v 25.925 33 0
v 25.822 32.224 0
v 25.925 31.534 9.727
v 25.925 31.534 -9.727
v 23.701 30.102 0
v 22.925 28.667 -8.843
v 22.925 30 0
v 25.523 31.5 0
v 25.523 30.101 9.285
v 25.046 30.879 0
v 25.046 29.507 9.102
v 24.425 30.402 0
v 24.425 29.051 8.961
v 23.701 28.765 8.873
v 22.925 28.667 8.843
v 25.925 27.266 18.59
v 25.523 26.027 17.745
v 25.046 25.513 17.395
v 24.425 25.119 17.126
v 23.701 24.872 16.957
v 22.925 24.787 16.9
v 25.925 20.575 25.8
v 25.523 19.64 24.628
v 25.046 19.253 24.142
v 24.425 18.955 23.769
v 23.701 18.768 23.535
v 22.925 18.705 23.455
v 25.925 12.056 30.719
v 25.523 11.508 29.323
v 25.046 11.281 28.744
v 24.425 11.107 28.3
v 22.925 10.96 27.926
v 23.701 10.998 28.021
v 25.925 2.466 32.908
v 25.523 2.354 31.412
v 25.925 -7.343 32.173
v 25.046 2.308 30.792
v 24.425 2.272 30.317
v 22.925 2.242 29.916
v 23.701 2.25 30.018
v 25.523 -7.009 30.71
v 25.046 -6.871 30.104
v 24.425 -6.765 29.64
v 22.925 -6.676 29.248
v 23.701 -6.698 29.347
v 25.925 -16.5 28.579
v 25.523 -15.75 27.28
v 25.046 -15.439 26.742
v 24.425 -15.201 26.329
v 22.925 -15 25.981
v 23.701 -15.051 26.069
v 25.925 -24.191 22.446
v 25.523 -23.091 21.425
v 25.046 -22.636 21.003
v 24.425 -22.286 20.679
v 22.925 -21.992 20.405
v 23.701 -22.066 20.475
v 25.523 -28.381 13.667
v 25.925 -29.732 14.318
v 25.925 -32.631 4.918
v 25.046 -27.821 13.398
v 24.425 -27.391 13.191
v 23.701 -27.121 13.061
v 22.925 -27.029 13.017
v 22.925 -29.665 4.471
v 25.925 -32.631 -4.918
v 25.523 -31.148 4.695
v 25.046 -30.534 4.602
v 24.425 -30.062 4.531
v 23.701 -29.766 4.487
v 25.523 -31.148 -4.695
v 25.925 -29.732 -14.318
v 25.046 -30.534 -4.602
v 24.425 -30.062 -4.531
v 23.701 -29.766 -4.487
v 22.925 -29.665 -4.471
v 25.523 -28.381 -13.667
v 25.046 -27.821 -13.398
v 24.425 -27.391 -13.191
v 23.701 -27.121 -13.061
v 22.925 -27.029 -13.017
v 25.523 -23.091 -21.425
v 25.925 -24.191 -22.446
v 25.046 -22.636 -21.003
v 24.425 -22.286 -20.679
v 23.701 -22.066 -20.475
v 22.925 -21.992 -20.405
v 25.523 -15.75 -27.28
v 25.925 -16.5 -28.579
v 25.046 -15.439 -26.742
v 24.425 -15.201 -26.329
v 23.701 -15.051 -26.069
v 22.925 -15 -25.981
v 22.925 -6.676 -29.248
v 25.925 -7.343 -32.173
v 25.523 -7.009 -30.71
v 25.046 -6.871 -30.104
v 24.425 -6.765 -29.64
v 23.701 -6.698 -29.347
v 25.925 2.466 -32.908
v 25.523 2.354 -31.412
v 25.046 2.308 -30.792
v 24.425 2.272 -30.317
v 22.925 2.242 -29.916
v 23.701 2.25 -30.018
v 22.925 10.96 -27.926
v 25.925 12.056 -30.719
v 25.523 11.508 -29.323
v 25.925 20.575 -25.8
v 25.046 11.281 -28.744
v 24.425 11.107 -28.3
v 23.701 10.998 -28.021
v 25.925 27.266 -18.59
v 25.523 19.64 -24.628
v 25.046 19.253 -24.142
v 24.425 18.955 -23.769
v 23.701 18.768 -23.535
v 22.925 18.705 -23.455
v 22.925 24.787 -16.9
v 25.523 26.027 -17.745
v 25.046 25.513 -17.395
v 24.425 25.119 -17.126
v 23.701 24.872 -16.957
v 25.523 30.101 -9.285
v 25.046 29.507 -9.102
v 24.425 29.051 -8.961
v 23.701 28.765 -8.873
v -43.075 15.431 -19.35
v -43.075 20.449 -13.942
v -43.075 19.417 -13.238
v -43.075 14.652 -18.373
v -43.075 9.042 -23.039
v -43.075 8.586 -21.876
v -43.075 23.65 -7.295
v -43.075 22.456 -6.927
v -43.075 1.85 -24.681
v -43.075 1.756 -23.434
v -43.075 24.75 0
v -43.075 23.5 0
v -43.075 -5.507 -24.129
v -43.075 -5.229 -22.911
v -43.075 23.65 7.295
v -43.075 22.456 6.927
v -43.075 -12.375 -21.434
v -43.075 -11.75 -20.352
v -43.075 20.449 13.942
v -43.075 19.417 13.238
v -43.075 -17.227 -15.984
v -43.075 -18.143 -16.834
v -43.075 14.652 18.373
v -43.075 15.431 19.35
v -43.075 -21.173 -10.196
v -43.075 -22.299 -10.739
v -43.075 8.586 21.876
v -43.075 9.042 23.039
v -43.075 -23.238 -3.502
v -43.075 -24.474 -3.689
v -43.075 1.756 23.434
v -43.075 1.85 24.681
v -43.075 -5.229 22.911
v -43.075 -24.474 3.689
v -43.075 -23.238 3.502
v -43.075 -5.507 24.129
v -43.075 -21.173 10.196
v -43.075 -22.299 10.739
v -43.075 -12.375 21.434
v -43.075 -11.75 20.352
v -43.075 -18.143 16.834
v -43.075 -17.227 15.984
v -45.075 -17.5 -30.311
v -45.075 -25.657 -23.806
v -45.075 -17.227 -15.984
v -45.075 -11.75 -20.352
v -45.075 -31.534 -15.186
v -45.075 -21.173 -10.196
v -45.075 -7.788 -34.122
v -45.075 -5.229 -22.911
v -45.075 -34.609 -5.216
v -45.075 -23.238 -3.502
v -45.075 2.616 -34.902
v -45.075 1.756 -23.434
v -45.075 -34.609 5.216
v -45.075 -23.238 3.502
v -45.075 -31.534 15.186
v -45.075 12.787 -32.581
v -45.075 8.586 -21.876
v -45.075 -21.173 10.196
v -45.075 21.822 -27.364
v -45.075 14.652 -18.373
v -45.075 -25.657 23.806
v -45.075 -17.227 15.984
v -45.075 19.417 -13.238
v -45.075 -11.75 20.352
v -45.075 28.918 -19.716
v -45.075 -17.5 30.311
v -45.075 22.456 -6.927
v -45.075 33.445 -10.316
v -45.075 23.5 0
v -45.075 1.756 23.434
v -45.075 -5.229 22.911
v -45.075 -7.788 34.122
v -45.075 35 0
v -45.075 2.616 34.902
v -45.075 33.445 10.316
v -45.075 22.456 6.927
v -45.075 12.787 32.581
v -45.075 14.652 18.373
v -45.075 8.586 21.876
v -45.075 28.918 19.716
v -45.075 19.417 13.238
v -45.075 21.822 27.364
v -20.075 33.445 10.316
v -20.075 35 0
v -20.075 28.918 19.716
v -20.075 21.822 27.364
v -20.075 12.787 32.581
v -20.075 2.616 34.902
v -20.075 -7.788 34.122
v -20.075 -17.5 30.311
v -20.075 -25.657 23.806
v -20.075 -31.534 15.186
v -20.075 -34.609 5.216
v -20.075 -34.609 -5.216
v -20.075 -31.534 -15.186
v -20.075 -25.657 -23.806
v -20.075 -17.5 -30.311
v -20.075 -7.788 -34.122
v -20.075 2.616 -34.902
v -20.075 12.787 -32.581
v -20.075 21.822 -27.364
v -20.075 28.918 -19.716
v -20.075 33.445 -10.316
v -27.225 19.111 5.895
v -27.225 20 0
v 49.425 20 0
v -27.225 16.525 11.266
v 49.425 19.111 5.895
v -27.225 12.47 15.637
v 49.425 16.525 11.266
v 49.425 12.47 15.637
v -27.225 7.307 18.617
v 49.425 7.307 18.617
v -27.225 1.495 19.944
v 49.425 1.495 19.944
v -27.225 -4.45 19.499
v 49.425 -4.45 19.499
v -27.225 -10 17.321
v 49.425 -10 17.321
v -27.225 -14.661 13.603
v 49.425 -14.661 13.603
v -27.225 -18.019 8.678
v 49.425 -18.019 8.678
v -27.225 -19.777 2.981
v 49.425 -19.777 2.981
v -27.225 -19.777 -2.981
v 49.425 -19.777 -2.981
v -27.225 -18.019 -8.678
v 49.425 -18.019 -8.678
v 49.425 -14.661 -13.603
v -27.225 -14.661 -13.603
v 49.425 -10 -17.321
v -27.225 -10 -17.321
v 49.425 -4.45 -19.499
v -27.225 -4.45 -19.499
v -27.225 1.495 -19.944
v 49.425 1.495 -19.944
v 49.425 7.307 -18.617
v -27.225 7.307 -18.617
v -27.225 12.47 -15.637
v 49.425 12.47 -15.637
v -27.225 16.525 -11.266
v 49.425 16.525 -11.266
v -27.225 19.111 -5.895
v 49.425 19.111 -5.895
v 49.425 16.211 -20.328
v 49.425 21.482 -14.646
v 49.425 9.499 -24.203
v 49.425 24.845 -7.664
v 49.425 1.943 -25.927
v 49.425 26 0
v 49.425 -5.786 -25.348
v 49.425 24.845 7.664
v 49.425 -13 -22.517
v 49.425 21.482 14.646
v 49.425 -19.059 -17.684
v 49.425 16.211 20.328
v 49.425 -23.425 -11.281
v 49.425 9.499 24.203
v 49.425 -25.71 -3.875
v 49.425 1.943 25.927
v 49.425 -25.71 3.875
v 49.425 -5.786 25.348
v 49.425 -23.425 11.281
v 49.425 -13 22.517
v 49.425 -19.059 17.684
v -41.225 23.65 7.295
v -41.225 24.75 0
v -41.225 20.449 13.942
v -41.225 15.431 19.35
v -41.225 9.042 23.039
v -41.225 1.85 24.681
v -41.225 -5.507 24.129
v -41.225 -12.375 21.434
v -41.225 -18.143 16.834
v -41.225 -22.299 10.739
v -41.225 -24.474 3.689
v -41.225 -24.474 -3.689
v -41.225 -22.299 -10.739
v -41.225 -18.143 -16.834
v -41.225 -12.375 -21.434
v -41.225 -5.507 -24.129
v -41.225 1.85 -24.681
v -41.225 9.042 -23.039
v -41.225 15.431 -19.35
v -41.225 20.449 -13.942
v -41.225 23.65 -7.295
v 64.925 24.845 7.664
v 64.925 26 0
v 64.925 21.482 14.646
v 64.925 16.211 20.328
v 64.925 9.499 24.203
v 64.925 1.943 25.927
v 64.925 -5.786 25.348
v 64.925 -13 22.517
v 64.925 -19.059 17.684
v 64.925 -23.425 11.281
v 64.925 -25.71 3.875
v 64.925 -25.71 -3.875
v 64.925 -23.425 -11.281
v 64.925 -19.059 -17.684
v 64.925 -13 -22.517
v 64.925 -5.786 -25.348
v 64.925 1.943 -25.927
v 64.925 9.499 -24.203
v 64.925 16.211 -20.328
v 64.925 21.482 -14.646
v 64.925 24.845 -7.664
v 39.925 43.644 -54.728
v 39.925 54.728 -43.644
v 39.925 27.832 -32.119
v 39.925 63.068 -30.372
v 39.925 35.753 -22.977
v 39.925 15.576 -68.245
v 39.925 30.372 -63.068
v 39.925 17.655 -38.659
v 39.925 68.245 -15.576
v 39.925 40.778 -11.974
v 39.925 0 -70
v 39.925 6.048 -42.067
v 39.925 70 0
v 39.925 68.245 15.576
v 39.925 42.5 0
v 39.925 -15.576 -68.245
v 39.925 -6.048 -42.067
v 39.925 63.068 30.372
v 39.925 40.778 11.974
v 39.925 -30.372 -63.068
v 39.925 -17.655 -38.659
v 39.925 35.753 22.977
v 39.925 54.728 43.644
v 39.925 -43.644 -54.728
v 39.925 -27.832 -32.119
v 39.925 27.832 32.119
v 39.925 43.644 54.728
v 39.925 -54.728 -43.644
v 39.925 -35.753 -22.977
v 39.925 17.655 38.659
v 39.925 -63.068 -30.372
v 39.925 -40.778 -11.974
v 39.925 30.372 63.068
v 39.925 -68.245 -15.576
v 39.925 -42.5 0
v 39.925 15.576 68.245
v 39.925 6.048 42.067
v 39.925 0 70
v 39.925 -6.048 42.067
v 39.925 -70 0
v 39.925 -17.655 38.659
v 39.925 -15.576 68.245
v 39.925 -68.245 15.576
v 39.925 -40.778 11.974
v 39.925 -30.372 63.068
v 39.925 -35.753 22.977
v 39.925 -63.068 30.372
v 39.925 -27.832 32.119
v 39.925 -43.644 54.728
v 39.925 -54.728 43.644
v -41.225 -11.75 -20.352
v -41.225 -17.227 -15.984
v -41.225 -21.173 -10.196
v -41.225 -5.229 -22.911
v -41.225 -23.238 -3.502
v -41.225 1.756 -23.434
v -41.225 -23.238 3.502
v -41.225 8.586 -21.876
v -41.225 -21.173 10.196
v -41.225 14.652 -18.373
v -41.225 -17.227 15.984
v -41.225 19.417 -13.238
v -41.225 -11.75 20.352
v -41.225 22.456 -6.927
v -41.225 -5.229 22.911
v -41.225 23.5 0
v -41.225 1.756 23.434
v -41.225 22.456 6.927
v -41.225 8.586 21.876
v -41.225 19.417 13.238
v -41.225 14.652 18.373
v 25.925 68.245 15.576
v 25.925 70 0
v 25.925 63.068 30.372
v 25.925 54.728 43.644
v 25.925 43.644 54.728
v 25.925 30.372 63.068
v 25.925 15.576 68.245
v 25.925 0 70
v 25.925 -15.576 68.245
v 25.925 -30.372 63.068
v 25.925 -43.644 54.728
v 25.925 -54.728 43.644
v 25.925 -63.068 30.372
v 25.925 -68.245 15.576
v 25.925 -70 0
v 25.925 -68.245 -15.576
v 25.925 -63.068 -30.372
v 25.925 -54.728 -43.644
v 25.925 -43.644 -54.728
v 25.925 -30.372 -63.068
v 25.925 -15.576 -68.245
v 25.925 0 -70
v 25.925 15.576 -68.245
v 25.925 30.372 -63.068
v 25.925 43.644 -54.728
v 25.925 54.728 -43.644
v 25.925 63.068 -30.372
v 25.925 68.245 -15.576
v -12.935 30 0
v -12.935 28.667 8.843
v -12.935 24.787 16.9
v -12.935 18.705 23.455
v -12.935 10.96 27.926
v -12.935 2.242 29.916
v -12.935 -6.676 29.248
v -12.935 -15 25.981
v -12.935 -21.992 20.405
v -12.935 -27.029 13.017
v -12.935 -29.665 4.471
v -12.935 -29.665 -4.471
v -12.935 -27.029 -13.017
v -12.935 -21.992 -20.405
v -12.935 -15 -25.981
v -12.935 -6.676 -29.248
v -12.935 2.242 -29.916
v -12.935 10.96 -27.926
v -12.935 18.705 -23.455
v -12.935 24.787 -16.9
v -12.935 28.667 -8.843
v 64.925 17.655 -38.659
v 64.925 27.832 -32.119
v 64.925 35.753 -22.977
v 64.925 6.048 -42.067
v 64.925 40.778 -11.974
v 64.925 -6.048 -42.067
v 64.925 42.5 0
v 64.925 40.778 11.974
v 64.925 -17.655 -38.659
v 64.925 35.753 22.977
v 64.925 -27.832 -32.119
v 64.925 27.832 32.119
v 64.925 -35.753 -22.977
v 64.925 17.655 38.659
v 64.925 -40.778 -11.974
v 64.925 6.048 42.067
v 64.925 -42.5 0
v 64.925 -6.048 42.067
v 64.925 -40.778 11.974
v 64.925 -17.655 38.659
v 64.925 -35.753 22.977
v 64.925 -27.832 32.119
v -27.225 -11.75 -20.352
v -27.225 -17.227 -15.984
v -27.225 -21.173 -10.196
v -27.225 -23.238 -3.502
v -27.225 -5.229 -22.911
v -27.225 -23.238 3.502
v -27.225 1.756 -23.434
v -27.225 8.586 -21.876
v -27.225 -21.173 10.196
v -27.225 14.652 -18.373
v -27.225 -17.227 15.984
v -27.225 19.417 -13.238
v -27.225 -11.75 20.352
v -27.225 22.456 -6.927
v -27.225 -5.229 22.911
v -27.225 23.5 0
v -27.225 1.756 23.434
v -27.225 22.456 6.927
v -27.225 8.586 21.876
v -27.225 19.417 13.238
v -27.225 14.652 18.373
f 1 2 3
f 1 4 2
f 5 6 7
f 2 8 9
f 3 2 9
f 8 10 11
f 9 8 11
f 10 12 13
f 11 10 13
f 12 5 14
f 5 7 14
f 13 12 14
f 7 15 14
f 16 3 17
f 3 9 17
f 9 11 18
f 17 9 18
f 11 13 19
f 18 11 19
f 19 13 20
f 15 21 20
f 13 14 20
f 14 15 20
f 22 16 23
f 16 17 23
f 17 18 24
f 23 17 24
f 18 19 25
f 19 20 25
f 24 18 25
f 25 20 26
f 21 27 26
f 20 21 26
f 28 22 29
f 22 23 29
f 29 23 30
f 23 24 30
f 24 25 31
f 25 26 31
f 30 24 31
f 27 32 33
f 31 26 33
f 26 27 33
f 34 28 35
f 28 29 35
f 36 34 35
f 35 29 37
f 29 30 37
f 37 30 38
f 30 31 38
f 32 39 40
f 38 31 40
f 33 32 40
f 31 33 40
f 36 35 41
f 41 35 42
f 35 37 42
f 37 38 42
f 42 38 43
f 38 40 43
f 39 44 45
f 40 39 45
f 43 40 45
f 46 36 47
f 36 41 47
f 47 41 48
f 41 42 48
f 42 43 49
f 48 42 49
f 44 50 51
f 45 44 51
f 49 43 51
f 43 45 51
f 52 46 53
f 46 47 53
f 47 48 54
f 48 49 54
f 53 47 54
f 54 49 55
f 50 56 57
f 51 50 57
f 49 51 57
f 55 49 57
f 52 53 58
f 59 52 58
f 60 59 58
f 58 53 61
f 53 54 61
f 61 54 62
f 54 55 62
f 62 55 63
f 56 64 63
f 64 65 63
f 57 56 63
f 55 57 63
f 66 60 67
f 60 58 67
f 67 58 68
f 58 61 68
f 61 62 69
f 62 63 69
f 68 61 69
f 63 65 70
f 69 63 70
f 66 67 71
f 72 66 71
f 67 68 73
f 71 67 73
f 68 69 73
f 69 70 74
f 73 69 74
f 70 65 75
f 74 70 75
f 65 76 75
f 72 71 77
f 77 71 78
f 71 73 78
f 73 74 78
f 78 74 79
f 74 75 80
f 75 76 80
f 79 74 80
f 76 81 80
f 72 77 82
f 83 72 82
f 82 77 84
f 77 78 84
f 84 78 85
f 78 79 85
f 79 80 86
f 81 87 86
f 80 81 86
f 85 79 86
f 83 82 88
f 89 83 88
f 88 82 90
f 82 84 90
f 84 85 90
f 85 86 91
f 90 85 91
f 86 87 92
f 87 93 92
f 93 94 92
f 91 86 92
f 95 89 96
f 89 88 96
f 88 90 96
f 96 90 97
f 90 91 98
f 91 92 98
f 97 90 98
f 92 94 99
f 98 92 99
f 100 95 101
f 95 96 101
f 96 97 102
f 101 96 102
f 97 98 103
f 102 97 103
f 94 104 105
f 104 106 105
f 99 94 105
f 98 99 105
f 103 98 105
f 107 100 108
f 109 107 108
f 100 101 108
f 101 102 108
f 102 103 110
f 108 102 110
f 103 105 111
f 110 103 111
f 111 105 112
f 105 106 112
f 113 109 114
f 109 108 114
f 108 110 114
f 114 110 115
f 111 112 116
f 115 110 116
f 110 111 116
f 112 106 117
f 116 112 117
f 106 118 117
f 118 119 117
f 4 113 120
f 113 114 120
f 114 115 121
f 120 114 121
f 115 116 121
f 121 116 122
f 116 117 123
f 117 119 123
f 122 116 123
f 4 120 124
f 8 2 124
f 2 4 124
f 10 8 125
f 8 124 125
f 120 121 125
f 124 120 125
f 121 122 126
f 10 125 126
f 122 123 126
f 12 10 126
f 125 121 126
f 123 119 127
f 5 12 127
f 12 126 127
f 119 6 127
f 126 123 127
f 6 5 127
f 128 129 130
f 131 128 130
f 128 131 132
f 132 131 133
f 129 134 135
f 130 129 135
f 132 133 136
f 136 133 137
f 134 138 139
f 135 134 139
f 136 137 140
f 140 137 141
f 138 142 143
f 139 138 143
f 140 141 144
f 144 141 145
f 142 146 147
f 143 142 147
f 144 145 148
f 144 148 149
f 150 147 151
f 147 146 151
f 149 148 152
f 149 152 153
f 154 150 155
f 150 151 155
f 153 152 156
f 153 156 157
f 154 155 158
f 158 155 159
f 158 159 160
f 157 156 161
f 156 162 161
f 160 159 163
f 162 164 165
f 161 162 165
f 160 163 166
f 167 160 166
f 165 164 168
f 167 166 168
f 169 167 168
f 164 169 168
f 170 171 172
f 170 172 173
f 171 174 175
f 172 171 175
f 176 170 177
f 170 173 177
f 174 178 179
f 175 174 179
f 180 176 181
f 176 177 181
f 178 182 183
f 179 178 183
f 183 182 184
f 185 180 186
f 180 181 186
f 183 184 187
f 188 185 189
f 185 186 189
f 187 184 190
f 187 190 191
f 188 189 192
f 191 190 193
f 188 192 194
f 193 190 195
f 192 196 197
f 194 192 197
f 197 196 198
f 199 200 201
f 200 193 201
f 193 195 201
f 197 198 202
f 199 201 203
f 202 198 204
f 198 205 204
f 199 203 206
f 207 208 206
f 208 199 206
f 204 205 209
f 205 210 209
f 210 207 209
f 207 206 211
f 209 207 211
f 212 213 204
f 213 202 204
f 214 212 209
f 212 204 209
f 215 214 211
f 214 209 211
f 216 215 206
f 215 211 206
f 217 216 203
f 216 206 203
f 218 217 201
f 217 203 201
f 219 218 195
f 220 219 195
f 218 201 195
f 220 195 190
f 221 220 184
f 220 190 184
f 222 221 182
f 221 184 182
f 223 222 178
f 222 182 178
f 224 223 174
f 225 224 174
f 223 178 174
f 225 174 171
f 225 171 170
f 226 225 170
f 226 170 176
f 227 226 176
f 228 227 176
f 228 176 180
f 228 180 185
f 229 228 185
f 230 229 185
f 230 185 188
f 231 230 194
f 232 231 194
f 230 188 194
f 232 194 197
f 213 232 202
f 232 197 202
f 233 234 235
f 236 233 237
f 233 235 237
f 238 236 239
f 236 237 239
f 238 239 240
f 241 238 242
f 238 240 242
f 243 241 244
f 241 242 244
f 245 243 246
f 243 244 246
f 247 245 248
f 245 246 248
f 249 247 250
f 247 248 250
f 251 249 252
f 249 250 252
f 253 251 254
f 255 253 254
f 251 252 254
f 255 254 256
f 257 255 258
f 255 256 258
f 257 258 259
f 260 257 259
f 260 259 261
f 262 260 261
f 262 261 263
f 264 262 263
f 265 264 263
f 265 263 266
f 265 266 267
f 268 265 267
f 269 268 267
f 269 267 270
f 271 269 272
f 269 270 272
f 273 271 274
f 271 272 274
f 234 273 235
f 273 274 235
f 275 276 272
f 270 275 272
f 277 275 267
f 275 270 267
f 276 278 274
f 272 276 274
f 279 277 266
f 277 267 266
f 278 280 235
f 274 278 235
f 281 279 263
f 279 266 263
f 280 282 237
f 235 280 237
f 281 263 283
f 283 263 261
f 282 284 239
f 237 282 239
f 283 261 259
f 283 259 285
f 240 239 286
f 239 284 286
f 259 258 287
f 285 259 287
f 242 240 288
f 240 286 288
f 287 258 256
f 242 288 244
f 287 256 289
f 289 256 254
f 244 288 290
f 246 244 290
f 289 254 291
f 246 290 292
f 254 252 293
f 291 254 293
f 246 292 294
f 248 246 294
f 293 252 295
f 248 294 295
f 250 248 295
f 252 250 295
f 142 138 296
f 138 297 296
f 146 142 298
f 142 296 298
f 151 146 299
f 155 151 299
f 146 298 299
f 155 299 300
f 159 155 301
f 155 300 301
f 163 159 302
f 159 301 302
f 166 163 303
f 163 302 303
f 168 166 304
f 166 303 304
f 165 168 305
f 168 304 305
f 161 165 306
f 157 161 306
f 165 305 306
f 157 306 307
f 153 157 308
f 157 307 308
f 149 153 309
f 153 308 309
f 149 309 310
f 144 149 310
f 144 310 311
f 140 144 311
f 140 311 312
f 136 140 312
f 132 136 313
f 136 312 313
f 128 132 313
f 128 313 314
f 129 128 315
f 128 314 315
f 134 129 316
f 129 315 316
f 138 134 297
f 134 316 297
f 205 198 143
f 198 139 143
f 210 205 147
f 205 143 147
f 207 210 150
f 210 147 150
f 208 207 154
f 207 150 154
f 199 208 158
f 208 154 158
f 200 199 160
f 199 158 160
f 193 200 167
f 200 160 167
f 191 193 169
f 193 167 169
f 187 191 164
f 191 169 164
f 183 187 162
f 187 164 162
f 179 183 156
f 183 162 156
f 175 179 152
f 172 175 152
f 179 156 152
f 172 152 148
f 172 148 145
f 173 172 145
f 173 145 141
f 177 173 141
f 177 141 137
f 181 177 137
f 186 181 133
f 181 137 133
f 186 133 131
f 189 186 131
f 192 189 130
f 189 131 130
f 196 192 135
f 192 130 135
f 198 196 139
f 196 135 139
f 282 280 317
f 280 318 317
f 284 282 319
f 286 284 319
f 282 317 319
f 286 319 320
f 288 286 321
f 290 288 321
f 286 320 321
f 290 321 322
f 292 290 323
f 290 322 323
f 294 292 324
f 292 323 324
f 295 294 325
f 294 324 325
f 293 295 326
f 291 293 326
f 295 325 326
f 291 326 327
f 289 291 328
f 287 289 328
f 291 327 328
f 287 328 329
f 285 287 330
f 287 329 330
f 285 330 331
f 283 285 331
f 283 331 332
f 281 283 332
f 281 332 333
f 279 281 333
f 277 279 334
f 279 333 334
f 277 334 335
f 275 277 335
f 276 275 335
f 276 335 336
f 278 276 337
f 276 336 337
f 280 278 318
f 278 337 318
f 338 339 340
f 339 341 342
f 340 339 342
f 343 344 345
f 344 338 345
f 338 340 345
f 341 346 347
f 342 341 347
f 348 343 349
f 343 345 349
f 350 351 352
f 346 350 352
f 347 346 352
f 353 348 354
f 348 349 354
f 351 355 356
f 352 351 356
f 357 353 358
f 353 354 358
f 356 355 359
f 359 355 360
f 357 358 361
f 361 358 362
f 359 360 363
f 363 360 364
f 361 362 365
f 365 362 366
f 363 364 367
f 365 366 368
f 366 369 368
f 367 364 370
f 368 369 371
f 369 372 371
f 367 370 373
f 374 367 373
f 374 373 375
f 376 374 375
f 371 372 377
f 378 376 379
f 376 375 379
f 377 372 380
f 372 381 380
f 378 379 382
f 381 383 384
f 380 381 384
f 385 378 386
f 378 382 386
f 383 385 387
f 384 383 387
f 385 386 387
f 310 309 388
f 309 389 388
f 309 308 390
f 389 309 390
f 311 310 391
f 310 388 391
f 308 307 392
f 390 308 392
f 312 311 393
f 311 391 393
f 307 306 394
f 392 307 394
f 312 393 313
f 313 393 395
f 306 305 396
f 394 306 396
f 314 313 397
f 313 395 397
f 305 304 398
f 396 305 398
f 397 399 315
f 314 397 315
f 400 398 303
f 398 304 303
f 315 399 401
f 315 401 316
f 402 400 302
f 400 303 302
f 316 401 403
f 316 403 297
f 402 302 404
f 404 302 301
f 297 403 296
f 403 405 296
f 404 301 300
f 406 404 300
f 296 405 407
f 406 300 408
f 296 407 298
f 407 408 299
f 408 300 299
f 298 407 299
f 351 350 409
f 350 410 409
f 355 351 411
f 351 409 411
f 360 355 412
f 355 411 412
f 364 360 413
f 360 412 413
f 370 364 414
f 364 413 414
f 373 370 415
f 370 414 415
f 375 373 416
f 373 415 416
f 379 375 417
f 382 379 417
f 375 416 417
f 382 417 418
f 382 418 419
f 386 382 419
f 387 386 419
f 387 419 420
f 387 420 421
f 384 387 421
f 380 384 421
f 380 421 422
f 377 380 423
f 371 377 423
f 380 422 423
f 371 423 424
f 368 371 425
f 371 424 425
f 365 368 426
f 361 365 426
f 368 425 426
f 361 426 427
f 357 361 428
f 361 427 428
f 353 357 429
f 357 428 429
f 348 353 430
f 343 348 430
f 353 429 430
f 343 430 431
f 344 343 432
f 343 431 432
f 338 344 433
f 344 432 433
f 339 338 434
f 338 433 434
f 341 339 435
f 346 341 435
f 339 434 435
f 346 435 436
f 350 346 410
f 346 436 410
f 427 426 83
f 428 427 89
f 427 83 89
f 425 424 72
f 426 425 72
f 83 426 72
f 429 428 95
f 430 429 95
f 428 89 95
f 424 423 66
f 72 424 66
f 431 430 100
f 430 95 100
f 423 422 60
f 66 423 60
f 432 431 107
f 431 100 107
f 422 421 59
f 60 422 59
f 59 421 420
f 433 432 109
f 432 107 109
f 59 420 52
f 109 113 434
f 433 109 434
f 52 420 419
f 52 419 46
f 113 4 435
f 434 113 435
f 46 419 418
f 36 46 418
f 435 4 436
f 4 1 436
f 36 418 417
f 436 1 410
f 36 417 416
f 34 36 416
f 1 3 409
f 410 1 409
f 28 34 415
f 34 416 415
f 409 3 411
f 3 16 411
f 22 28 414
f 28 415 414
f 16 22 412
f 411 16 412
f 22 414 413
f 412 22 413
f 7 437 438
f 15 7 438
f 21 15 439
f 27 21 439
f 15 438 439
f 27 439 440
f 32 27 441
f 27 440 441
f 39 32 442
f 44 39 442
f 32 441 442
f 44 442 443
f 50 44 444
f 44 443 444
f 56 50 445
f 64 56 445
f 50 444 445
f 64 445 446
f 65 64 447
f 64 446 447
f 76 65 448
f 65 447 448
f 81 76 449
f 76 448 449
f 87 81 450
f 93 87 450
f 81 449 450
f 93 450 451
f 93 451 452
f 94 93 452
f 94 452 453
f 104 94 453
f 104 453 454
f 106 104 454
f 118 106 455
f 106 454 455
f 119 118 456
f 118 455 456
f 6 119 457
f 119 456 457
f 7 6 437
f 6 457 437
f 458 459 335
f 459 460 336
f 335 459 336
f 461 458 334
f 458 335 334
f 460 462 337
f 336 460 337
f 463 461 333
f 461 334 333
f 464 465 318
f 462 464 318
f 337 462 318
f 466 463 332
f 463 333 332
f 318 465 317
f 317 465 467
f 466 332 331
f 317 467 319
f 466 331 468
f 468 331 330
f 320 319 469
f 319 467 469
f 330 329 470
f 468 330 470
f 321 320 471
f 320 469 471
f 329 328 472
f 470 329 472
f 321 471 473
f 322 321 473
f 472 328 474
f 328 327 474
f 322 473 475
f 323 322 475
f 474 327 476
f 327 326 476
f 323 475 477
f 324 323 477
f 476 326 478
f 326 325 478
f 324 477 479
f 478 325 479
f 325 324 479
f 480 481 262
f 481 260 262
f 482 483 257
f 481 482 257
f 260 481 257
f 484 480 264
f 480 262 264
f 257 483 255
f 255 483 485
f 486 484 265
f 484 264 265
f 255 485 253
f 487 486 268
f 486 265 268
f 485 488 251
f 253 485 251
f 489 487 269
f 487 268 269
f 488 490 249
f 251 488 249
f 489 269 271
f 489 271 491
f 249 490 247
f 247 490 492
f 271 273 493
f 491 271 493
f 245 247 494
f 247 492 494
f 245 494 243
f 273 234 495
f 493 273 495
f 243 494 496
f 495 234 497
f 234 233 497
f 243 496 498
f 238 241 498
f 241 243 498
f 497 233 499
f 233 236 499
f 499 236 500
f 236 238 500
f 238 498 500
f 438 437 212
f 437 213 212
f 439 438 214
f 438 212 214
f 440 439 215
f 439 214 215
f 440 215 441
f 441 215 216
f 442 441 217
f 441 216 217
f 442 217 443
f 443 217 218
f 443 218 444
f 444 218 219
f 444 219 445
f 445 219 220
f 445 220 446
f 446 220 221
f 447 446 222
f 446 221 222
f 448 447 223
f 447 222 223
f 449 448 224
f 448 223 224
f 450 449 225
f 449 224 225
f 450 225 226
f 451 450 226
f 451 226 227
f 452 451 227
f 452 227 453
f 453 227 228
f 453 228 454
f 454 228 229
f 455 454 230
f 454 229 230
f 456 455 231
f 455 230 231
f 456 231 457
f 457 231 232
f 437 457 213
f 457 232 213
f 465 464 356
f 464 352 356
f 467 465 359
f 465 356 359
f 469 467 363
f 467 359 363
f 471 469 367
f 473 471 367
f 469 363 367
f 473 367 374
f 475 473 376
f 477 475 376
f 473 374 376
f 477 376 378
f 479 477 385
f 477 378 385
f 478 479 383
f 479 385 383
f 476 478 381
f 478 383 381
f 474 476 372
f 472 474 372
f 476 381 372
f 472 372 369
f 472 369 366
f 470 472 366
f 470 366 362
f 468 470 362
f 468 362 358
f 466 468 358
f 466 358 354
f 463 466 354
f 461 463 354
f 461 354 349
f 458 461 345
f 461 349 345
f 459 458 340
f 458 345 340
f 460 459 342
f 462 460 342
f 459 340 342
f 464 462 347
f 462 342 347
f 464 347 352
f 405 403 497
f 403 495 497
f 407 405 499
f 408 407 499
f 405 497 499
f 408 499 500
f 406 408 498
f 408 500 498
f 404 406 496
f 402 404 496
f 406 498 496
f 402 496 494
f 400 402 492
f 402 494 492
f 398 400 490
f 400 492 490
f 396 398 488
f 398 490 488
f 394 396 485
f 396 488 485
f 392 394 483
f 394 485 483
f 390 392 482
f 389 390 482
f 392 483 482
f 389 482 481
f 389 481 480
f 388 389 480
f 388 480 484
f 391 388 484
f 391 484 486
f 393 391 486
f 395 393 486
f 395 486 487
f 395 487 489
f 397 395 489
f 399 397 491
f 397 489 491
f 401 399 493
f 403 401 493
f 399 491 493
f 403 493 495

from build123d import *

# Parameters (mm, degrees)
RACCORDO1_R = 3


with BuildPart() as part:
    # Schizzo1 → Rivoluzione1 (revolve)
    with BuildSketch(Plane.XY):
        Polygon((-41.225471698, 23.5), (-27.225471698, 23.5), (-27.225471698, 20), (49.424528302, 20), (49.424528302, 26), (64.924528302, 26), (64.924528302, 42.5), (39.924528302, 42.5), (39.924528302, 70), (25.924528302, 70), (25.924528302, 30), (-12.934731664, 30), (-20.075471698, 35), (-45.075471698, 35), (-45.075471698, 23.5), (-43.075471698, 23.5), (-43.075471698, 24.75), (-41.225471698, 24.75), align=None)
    revolve(axis=Axis((0, 0, 0), (1, 0, 0)))

    # Raccordo1
    raccordo1_edges = [part.edges().sort_by_distance(p)[0] for p in [
        (25.924528302, -30, 0),
    ]]
    fillet(raccordo1_edges, radius=RACCORDO1_R)


solid = part.part
